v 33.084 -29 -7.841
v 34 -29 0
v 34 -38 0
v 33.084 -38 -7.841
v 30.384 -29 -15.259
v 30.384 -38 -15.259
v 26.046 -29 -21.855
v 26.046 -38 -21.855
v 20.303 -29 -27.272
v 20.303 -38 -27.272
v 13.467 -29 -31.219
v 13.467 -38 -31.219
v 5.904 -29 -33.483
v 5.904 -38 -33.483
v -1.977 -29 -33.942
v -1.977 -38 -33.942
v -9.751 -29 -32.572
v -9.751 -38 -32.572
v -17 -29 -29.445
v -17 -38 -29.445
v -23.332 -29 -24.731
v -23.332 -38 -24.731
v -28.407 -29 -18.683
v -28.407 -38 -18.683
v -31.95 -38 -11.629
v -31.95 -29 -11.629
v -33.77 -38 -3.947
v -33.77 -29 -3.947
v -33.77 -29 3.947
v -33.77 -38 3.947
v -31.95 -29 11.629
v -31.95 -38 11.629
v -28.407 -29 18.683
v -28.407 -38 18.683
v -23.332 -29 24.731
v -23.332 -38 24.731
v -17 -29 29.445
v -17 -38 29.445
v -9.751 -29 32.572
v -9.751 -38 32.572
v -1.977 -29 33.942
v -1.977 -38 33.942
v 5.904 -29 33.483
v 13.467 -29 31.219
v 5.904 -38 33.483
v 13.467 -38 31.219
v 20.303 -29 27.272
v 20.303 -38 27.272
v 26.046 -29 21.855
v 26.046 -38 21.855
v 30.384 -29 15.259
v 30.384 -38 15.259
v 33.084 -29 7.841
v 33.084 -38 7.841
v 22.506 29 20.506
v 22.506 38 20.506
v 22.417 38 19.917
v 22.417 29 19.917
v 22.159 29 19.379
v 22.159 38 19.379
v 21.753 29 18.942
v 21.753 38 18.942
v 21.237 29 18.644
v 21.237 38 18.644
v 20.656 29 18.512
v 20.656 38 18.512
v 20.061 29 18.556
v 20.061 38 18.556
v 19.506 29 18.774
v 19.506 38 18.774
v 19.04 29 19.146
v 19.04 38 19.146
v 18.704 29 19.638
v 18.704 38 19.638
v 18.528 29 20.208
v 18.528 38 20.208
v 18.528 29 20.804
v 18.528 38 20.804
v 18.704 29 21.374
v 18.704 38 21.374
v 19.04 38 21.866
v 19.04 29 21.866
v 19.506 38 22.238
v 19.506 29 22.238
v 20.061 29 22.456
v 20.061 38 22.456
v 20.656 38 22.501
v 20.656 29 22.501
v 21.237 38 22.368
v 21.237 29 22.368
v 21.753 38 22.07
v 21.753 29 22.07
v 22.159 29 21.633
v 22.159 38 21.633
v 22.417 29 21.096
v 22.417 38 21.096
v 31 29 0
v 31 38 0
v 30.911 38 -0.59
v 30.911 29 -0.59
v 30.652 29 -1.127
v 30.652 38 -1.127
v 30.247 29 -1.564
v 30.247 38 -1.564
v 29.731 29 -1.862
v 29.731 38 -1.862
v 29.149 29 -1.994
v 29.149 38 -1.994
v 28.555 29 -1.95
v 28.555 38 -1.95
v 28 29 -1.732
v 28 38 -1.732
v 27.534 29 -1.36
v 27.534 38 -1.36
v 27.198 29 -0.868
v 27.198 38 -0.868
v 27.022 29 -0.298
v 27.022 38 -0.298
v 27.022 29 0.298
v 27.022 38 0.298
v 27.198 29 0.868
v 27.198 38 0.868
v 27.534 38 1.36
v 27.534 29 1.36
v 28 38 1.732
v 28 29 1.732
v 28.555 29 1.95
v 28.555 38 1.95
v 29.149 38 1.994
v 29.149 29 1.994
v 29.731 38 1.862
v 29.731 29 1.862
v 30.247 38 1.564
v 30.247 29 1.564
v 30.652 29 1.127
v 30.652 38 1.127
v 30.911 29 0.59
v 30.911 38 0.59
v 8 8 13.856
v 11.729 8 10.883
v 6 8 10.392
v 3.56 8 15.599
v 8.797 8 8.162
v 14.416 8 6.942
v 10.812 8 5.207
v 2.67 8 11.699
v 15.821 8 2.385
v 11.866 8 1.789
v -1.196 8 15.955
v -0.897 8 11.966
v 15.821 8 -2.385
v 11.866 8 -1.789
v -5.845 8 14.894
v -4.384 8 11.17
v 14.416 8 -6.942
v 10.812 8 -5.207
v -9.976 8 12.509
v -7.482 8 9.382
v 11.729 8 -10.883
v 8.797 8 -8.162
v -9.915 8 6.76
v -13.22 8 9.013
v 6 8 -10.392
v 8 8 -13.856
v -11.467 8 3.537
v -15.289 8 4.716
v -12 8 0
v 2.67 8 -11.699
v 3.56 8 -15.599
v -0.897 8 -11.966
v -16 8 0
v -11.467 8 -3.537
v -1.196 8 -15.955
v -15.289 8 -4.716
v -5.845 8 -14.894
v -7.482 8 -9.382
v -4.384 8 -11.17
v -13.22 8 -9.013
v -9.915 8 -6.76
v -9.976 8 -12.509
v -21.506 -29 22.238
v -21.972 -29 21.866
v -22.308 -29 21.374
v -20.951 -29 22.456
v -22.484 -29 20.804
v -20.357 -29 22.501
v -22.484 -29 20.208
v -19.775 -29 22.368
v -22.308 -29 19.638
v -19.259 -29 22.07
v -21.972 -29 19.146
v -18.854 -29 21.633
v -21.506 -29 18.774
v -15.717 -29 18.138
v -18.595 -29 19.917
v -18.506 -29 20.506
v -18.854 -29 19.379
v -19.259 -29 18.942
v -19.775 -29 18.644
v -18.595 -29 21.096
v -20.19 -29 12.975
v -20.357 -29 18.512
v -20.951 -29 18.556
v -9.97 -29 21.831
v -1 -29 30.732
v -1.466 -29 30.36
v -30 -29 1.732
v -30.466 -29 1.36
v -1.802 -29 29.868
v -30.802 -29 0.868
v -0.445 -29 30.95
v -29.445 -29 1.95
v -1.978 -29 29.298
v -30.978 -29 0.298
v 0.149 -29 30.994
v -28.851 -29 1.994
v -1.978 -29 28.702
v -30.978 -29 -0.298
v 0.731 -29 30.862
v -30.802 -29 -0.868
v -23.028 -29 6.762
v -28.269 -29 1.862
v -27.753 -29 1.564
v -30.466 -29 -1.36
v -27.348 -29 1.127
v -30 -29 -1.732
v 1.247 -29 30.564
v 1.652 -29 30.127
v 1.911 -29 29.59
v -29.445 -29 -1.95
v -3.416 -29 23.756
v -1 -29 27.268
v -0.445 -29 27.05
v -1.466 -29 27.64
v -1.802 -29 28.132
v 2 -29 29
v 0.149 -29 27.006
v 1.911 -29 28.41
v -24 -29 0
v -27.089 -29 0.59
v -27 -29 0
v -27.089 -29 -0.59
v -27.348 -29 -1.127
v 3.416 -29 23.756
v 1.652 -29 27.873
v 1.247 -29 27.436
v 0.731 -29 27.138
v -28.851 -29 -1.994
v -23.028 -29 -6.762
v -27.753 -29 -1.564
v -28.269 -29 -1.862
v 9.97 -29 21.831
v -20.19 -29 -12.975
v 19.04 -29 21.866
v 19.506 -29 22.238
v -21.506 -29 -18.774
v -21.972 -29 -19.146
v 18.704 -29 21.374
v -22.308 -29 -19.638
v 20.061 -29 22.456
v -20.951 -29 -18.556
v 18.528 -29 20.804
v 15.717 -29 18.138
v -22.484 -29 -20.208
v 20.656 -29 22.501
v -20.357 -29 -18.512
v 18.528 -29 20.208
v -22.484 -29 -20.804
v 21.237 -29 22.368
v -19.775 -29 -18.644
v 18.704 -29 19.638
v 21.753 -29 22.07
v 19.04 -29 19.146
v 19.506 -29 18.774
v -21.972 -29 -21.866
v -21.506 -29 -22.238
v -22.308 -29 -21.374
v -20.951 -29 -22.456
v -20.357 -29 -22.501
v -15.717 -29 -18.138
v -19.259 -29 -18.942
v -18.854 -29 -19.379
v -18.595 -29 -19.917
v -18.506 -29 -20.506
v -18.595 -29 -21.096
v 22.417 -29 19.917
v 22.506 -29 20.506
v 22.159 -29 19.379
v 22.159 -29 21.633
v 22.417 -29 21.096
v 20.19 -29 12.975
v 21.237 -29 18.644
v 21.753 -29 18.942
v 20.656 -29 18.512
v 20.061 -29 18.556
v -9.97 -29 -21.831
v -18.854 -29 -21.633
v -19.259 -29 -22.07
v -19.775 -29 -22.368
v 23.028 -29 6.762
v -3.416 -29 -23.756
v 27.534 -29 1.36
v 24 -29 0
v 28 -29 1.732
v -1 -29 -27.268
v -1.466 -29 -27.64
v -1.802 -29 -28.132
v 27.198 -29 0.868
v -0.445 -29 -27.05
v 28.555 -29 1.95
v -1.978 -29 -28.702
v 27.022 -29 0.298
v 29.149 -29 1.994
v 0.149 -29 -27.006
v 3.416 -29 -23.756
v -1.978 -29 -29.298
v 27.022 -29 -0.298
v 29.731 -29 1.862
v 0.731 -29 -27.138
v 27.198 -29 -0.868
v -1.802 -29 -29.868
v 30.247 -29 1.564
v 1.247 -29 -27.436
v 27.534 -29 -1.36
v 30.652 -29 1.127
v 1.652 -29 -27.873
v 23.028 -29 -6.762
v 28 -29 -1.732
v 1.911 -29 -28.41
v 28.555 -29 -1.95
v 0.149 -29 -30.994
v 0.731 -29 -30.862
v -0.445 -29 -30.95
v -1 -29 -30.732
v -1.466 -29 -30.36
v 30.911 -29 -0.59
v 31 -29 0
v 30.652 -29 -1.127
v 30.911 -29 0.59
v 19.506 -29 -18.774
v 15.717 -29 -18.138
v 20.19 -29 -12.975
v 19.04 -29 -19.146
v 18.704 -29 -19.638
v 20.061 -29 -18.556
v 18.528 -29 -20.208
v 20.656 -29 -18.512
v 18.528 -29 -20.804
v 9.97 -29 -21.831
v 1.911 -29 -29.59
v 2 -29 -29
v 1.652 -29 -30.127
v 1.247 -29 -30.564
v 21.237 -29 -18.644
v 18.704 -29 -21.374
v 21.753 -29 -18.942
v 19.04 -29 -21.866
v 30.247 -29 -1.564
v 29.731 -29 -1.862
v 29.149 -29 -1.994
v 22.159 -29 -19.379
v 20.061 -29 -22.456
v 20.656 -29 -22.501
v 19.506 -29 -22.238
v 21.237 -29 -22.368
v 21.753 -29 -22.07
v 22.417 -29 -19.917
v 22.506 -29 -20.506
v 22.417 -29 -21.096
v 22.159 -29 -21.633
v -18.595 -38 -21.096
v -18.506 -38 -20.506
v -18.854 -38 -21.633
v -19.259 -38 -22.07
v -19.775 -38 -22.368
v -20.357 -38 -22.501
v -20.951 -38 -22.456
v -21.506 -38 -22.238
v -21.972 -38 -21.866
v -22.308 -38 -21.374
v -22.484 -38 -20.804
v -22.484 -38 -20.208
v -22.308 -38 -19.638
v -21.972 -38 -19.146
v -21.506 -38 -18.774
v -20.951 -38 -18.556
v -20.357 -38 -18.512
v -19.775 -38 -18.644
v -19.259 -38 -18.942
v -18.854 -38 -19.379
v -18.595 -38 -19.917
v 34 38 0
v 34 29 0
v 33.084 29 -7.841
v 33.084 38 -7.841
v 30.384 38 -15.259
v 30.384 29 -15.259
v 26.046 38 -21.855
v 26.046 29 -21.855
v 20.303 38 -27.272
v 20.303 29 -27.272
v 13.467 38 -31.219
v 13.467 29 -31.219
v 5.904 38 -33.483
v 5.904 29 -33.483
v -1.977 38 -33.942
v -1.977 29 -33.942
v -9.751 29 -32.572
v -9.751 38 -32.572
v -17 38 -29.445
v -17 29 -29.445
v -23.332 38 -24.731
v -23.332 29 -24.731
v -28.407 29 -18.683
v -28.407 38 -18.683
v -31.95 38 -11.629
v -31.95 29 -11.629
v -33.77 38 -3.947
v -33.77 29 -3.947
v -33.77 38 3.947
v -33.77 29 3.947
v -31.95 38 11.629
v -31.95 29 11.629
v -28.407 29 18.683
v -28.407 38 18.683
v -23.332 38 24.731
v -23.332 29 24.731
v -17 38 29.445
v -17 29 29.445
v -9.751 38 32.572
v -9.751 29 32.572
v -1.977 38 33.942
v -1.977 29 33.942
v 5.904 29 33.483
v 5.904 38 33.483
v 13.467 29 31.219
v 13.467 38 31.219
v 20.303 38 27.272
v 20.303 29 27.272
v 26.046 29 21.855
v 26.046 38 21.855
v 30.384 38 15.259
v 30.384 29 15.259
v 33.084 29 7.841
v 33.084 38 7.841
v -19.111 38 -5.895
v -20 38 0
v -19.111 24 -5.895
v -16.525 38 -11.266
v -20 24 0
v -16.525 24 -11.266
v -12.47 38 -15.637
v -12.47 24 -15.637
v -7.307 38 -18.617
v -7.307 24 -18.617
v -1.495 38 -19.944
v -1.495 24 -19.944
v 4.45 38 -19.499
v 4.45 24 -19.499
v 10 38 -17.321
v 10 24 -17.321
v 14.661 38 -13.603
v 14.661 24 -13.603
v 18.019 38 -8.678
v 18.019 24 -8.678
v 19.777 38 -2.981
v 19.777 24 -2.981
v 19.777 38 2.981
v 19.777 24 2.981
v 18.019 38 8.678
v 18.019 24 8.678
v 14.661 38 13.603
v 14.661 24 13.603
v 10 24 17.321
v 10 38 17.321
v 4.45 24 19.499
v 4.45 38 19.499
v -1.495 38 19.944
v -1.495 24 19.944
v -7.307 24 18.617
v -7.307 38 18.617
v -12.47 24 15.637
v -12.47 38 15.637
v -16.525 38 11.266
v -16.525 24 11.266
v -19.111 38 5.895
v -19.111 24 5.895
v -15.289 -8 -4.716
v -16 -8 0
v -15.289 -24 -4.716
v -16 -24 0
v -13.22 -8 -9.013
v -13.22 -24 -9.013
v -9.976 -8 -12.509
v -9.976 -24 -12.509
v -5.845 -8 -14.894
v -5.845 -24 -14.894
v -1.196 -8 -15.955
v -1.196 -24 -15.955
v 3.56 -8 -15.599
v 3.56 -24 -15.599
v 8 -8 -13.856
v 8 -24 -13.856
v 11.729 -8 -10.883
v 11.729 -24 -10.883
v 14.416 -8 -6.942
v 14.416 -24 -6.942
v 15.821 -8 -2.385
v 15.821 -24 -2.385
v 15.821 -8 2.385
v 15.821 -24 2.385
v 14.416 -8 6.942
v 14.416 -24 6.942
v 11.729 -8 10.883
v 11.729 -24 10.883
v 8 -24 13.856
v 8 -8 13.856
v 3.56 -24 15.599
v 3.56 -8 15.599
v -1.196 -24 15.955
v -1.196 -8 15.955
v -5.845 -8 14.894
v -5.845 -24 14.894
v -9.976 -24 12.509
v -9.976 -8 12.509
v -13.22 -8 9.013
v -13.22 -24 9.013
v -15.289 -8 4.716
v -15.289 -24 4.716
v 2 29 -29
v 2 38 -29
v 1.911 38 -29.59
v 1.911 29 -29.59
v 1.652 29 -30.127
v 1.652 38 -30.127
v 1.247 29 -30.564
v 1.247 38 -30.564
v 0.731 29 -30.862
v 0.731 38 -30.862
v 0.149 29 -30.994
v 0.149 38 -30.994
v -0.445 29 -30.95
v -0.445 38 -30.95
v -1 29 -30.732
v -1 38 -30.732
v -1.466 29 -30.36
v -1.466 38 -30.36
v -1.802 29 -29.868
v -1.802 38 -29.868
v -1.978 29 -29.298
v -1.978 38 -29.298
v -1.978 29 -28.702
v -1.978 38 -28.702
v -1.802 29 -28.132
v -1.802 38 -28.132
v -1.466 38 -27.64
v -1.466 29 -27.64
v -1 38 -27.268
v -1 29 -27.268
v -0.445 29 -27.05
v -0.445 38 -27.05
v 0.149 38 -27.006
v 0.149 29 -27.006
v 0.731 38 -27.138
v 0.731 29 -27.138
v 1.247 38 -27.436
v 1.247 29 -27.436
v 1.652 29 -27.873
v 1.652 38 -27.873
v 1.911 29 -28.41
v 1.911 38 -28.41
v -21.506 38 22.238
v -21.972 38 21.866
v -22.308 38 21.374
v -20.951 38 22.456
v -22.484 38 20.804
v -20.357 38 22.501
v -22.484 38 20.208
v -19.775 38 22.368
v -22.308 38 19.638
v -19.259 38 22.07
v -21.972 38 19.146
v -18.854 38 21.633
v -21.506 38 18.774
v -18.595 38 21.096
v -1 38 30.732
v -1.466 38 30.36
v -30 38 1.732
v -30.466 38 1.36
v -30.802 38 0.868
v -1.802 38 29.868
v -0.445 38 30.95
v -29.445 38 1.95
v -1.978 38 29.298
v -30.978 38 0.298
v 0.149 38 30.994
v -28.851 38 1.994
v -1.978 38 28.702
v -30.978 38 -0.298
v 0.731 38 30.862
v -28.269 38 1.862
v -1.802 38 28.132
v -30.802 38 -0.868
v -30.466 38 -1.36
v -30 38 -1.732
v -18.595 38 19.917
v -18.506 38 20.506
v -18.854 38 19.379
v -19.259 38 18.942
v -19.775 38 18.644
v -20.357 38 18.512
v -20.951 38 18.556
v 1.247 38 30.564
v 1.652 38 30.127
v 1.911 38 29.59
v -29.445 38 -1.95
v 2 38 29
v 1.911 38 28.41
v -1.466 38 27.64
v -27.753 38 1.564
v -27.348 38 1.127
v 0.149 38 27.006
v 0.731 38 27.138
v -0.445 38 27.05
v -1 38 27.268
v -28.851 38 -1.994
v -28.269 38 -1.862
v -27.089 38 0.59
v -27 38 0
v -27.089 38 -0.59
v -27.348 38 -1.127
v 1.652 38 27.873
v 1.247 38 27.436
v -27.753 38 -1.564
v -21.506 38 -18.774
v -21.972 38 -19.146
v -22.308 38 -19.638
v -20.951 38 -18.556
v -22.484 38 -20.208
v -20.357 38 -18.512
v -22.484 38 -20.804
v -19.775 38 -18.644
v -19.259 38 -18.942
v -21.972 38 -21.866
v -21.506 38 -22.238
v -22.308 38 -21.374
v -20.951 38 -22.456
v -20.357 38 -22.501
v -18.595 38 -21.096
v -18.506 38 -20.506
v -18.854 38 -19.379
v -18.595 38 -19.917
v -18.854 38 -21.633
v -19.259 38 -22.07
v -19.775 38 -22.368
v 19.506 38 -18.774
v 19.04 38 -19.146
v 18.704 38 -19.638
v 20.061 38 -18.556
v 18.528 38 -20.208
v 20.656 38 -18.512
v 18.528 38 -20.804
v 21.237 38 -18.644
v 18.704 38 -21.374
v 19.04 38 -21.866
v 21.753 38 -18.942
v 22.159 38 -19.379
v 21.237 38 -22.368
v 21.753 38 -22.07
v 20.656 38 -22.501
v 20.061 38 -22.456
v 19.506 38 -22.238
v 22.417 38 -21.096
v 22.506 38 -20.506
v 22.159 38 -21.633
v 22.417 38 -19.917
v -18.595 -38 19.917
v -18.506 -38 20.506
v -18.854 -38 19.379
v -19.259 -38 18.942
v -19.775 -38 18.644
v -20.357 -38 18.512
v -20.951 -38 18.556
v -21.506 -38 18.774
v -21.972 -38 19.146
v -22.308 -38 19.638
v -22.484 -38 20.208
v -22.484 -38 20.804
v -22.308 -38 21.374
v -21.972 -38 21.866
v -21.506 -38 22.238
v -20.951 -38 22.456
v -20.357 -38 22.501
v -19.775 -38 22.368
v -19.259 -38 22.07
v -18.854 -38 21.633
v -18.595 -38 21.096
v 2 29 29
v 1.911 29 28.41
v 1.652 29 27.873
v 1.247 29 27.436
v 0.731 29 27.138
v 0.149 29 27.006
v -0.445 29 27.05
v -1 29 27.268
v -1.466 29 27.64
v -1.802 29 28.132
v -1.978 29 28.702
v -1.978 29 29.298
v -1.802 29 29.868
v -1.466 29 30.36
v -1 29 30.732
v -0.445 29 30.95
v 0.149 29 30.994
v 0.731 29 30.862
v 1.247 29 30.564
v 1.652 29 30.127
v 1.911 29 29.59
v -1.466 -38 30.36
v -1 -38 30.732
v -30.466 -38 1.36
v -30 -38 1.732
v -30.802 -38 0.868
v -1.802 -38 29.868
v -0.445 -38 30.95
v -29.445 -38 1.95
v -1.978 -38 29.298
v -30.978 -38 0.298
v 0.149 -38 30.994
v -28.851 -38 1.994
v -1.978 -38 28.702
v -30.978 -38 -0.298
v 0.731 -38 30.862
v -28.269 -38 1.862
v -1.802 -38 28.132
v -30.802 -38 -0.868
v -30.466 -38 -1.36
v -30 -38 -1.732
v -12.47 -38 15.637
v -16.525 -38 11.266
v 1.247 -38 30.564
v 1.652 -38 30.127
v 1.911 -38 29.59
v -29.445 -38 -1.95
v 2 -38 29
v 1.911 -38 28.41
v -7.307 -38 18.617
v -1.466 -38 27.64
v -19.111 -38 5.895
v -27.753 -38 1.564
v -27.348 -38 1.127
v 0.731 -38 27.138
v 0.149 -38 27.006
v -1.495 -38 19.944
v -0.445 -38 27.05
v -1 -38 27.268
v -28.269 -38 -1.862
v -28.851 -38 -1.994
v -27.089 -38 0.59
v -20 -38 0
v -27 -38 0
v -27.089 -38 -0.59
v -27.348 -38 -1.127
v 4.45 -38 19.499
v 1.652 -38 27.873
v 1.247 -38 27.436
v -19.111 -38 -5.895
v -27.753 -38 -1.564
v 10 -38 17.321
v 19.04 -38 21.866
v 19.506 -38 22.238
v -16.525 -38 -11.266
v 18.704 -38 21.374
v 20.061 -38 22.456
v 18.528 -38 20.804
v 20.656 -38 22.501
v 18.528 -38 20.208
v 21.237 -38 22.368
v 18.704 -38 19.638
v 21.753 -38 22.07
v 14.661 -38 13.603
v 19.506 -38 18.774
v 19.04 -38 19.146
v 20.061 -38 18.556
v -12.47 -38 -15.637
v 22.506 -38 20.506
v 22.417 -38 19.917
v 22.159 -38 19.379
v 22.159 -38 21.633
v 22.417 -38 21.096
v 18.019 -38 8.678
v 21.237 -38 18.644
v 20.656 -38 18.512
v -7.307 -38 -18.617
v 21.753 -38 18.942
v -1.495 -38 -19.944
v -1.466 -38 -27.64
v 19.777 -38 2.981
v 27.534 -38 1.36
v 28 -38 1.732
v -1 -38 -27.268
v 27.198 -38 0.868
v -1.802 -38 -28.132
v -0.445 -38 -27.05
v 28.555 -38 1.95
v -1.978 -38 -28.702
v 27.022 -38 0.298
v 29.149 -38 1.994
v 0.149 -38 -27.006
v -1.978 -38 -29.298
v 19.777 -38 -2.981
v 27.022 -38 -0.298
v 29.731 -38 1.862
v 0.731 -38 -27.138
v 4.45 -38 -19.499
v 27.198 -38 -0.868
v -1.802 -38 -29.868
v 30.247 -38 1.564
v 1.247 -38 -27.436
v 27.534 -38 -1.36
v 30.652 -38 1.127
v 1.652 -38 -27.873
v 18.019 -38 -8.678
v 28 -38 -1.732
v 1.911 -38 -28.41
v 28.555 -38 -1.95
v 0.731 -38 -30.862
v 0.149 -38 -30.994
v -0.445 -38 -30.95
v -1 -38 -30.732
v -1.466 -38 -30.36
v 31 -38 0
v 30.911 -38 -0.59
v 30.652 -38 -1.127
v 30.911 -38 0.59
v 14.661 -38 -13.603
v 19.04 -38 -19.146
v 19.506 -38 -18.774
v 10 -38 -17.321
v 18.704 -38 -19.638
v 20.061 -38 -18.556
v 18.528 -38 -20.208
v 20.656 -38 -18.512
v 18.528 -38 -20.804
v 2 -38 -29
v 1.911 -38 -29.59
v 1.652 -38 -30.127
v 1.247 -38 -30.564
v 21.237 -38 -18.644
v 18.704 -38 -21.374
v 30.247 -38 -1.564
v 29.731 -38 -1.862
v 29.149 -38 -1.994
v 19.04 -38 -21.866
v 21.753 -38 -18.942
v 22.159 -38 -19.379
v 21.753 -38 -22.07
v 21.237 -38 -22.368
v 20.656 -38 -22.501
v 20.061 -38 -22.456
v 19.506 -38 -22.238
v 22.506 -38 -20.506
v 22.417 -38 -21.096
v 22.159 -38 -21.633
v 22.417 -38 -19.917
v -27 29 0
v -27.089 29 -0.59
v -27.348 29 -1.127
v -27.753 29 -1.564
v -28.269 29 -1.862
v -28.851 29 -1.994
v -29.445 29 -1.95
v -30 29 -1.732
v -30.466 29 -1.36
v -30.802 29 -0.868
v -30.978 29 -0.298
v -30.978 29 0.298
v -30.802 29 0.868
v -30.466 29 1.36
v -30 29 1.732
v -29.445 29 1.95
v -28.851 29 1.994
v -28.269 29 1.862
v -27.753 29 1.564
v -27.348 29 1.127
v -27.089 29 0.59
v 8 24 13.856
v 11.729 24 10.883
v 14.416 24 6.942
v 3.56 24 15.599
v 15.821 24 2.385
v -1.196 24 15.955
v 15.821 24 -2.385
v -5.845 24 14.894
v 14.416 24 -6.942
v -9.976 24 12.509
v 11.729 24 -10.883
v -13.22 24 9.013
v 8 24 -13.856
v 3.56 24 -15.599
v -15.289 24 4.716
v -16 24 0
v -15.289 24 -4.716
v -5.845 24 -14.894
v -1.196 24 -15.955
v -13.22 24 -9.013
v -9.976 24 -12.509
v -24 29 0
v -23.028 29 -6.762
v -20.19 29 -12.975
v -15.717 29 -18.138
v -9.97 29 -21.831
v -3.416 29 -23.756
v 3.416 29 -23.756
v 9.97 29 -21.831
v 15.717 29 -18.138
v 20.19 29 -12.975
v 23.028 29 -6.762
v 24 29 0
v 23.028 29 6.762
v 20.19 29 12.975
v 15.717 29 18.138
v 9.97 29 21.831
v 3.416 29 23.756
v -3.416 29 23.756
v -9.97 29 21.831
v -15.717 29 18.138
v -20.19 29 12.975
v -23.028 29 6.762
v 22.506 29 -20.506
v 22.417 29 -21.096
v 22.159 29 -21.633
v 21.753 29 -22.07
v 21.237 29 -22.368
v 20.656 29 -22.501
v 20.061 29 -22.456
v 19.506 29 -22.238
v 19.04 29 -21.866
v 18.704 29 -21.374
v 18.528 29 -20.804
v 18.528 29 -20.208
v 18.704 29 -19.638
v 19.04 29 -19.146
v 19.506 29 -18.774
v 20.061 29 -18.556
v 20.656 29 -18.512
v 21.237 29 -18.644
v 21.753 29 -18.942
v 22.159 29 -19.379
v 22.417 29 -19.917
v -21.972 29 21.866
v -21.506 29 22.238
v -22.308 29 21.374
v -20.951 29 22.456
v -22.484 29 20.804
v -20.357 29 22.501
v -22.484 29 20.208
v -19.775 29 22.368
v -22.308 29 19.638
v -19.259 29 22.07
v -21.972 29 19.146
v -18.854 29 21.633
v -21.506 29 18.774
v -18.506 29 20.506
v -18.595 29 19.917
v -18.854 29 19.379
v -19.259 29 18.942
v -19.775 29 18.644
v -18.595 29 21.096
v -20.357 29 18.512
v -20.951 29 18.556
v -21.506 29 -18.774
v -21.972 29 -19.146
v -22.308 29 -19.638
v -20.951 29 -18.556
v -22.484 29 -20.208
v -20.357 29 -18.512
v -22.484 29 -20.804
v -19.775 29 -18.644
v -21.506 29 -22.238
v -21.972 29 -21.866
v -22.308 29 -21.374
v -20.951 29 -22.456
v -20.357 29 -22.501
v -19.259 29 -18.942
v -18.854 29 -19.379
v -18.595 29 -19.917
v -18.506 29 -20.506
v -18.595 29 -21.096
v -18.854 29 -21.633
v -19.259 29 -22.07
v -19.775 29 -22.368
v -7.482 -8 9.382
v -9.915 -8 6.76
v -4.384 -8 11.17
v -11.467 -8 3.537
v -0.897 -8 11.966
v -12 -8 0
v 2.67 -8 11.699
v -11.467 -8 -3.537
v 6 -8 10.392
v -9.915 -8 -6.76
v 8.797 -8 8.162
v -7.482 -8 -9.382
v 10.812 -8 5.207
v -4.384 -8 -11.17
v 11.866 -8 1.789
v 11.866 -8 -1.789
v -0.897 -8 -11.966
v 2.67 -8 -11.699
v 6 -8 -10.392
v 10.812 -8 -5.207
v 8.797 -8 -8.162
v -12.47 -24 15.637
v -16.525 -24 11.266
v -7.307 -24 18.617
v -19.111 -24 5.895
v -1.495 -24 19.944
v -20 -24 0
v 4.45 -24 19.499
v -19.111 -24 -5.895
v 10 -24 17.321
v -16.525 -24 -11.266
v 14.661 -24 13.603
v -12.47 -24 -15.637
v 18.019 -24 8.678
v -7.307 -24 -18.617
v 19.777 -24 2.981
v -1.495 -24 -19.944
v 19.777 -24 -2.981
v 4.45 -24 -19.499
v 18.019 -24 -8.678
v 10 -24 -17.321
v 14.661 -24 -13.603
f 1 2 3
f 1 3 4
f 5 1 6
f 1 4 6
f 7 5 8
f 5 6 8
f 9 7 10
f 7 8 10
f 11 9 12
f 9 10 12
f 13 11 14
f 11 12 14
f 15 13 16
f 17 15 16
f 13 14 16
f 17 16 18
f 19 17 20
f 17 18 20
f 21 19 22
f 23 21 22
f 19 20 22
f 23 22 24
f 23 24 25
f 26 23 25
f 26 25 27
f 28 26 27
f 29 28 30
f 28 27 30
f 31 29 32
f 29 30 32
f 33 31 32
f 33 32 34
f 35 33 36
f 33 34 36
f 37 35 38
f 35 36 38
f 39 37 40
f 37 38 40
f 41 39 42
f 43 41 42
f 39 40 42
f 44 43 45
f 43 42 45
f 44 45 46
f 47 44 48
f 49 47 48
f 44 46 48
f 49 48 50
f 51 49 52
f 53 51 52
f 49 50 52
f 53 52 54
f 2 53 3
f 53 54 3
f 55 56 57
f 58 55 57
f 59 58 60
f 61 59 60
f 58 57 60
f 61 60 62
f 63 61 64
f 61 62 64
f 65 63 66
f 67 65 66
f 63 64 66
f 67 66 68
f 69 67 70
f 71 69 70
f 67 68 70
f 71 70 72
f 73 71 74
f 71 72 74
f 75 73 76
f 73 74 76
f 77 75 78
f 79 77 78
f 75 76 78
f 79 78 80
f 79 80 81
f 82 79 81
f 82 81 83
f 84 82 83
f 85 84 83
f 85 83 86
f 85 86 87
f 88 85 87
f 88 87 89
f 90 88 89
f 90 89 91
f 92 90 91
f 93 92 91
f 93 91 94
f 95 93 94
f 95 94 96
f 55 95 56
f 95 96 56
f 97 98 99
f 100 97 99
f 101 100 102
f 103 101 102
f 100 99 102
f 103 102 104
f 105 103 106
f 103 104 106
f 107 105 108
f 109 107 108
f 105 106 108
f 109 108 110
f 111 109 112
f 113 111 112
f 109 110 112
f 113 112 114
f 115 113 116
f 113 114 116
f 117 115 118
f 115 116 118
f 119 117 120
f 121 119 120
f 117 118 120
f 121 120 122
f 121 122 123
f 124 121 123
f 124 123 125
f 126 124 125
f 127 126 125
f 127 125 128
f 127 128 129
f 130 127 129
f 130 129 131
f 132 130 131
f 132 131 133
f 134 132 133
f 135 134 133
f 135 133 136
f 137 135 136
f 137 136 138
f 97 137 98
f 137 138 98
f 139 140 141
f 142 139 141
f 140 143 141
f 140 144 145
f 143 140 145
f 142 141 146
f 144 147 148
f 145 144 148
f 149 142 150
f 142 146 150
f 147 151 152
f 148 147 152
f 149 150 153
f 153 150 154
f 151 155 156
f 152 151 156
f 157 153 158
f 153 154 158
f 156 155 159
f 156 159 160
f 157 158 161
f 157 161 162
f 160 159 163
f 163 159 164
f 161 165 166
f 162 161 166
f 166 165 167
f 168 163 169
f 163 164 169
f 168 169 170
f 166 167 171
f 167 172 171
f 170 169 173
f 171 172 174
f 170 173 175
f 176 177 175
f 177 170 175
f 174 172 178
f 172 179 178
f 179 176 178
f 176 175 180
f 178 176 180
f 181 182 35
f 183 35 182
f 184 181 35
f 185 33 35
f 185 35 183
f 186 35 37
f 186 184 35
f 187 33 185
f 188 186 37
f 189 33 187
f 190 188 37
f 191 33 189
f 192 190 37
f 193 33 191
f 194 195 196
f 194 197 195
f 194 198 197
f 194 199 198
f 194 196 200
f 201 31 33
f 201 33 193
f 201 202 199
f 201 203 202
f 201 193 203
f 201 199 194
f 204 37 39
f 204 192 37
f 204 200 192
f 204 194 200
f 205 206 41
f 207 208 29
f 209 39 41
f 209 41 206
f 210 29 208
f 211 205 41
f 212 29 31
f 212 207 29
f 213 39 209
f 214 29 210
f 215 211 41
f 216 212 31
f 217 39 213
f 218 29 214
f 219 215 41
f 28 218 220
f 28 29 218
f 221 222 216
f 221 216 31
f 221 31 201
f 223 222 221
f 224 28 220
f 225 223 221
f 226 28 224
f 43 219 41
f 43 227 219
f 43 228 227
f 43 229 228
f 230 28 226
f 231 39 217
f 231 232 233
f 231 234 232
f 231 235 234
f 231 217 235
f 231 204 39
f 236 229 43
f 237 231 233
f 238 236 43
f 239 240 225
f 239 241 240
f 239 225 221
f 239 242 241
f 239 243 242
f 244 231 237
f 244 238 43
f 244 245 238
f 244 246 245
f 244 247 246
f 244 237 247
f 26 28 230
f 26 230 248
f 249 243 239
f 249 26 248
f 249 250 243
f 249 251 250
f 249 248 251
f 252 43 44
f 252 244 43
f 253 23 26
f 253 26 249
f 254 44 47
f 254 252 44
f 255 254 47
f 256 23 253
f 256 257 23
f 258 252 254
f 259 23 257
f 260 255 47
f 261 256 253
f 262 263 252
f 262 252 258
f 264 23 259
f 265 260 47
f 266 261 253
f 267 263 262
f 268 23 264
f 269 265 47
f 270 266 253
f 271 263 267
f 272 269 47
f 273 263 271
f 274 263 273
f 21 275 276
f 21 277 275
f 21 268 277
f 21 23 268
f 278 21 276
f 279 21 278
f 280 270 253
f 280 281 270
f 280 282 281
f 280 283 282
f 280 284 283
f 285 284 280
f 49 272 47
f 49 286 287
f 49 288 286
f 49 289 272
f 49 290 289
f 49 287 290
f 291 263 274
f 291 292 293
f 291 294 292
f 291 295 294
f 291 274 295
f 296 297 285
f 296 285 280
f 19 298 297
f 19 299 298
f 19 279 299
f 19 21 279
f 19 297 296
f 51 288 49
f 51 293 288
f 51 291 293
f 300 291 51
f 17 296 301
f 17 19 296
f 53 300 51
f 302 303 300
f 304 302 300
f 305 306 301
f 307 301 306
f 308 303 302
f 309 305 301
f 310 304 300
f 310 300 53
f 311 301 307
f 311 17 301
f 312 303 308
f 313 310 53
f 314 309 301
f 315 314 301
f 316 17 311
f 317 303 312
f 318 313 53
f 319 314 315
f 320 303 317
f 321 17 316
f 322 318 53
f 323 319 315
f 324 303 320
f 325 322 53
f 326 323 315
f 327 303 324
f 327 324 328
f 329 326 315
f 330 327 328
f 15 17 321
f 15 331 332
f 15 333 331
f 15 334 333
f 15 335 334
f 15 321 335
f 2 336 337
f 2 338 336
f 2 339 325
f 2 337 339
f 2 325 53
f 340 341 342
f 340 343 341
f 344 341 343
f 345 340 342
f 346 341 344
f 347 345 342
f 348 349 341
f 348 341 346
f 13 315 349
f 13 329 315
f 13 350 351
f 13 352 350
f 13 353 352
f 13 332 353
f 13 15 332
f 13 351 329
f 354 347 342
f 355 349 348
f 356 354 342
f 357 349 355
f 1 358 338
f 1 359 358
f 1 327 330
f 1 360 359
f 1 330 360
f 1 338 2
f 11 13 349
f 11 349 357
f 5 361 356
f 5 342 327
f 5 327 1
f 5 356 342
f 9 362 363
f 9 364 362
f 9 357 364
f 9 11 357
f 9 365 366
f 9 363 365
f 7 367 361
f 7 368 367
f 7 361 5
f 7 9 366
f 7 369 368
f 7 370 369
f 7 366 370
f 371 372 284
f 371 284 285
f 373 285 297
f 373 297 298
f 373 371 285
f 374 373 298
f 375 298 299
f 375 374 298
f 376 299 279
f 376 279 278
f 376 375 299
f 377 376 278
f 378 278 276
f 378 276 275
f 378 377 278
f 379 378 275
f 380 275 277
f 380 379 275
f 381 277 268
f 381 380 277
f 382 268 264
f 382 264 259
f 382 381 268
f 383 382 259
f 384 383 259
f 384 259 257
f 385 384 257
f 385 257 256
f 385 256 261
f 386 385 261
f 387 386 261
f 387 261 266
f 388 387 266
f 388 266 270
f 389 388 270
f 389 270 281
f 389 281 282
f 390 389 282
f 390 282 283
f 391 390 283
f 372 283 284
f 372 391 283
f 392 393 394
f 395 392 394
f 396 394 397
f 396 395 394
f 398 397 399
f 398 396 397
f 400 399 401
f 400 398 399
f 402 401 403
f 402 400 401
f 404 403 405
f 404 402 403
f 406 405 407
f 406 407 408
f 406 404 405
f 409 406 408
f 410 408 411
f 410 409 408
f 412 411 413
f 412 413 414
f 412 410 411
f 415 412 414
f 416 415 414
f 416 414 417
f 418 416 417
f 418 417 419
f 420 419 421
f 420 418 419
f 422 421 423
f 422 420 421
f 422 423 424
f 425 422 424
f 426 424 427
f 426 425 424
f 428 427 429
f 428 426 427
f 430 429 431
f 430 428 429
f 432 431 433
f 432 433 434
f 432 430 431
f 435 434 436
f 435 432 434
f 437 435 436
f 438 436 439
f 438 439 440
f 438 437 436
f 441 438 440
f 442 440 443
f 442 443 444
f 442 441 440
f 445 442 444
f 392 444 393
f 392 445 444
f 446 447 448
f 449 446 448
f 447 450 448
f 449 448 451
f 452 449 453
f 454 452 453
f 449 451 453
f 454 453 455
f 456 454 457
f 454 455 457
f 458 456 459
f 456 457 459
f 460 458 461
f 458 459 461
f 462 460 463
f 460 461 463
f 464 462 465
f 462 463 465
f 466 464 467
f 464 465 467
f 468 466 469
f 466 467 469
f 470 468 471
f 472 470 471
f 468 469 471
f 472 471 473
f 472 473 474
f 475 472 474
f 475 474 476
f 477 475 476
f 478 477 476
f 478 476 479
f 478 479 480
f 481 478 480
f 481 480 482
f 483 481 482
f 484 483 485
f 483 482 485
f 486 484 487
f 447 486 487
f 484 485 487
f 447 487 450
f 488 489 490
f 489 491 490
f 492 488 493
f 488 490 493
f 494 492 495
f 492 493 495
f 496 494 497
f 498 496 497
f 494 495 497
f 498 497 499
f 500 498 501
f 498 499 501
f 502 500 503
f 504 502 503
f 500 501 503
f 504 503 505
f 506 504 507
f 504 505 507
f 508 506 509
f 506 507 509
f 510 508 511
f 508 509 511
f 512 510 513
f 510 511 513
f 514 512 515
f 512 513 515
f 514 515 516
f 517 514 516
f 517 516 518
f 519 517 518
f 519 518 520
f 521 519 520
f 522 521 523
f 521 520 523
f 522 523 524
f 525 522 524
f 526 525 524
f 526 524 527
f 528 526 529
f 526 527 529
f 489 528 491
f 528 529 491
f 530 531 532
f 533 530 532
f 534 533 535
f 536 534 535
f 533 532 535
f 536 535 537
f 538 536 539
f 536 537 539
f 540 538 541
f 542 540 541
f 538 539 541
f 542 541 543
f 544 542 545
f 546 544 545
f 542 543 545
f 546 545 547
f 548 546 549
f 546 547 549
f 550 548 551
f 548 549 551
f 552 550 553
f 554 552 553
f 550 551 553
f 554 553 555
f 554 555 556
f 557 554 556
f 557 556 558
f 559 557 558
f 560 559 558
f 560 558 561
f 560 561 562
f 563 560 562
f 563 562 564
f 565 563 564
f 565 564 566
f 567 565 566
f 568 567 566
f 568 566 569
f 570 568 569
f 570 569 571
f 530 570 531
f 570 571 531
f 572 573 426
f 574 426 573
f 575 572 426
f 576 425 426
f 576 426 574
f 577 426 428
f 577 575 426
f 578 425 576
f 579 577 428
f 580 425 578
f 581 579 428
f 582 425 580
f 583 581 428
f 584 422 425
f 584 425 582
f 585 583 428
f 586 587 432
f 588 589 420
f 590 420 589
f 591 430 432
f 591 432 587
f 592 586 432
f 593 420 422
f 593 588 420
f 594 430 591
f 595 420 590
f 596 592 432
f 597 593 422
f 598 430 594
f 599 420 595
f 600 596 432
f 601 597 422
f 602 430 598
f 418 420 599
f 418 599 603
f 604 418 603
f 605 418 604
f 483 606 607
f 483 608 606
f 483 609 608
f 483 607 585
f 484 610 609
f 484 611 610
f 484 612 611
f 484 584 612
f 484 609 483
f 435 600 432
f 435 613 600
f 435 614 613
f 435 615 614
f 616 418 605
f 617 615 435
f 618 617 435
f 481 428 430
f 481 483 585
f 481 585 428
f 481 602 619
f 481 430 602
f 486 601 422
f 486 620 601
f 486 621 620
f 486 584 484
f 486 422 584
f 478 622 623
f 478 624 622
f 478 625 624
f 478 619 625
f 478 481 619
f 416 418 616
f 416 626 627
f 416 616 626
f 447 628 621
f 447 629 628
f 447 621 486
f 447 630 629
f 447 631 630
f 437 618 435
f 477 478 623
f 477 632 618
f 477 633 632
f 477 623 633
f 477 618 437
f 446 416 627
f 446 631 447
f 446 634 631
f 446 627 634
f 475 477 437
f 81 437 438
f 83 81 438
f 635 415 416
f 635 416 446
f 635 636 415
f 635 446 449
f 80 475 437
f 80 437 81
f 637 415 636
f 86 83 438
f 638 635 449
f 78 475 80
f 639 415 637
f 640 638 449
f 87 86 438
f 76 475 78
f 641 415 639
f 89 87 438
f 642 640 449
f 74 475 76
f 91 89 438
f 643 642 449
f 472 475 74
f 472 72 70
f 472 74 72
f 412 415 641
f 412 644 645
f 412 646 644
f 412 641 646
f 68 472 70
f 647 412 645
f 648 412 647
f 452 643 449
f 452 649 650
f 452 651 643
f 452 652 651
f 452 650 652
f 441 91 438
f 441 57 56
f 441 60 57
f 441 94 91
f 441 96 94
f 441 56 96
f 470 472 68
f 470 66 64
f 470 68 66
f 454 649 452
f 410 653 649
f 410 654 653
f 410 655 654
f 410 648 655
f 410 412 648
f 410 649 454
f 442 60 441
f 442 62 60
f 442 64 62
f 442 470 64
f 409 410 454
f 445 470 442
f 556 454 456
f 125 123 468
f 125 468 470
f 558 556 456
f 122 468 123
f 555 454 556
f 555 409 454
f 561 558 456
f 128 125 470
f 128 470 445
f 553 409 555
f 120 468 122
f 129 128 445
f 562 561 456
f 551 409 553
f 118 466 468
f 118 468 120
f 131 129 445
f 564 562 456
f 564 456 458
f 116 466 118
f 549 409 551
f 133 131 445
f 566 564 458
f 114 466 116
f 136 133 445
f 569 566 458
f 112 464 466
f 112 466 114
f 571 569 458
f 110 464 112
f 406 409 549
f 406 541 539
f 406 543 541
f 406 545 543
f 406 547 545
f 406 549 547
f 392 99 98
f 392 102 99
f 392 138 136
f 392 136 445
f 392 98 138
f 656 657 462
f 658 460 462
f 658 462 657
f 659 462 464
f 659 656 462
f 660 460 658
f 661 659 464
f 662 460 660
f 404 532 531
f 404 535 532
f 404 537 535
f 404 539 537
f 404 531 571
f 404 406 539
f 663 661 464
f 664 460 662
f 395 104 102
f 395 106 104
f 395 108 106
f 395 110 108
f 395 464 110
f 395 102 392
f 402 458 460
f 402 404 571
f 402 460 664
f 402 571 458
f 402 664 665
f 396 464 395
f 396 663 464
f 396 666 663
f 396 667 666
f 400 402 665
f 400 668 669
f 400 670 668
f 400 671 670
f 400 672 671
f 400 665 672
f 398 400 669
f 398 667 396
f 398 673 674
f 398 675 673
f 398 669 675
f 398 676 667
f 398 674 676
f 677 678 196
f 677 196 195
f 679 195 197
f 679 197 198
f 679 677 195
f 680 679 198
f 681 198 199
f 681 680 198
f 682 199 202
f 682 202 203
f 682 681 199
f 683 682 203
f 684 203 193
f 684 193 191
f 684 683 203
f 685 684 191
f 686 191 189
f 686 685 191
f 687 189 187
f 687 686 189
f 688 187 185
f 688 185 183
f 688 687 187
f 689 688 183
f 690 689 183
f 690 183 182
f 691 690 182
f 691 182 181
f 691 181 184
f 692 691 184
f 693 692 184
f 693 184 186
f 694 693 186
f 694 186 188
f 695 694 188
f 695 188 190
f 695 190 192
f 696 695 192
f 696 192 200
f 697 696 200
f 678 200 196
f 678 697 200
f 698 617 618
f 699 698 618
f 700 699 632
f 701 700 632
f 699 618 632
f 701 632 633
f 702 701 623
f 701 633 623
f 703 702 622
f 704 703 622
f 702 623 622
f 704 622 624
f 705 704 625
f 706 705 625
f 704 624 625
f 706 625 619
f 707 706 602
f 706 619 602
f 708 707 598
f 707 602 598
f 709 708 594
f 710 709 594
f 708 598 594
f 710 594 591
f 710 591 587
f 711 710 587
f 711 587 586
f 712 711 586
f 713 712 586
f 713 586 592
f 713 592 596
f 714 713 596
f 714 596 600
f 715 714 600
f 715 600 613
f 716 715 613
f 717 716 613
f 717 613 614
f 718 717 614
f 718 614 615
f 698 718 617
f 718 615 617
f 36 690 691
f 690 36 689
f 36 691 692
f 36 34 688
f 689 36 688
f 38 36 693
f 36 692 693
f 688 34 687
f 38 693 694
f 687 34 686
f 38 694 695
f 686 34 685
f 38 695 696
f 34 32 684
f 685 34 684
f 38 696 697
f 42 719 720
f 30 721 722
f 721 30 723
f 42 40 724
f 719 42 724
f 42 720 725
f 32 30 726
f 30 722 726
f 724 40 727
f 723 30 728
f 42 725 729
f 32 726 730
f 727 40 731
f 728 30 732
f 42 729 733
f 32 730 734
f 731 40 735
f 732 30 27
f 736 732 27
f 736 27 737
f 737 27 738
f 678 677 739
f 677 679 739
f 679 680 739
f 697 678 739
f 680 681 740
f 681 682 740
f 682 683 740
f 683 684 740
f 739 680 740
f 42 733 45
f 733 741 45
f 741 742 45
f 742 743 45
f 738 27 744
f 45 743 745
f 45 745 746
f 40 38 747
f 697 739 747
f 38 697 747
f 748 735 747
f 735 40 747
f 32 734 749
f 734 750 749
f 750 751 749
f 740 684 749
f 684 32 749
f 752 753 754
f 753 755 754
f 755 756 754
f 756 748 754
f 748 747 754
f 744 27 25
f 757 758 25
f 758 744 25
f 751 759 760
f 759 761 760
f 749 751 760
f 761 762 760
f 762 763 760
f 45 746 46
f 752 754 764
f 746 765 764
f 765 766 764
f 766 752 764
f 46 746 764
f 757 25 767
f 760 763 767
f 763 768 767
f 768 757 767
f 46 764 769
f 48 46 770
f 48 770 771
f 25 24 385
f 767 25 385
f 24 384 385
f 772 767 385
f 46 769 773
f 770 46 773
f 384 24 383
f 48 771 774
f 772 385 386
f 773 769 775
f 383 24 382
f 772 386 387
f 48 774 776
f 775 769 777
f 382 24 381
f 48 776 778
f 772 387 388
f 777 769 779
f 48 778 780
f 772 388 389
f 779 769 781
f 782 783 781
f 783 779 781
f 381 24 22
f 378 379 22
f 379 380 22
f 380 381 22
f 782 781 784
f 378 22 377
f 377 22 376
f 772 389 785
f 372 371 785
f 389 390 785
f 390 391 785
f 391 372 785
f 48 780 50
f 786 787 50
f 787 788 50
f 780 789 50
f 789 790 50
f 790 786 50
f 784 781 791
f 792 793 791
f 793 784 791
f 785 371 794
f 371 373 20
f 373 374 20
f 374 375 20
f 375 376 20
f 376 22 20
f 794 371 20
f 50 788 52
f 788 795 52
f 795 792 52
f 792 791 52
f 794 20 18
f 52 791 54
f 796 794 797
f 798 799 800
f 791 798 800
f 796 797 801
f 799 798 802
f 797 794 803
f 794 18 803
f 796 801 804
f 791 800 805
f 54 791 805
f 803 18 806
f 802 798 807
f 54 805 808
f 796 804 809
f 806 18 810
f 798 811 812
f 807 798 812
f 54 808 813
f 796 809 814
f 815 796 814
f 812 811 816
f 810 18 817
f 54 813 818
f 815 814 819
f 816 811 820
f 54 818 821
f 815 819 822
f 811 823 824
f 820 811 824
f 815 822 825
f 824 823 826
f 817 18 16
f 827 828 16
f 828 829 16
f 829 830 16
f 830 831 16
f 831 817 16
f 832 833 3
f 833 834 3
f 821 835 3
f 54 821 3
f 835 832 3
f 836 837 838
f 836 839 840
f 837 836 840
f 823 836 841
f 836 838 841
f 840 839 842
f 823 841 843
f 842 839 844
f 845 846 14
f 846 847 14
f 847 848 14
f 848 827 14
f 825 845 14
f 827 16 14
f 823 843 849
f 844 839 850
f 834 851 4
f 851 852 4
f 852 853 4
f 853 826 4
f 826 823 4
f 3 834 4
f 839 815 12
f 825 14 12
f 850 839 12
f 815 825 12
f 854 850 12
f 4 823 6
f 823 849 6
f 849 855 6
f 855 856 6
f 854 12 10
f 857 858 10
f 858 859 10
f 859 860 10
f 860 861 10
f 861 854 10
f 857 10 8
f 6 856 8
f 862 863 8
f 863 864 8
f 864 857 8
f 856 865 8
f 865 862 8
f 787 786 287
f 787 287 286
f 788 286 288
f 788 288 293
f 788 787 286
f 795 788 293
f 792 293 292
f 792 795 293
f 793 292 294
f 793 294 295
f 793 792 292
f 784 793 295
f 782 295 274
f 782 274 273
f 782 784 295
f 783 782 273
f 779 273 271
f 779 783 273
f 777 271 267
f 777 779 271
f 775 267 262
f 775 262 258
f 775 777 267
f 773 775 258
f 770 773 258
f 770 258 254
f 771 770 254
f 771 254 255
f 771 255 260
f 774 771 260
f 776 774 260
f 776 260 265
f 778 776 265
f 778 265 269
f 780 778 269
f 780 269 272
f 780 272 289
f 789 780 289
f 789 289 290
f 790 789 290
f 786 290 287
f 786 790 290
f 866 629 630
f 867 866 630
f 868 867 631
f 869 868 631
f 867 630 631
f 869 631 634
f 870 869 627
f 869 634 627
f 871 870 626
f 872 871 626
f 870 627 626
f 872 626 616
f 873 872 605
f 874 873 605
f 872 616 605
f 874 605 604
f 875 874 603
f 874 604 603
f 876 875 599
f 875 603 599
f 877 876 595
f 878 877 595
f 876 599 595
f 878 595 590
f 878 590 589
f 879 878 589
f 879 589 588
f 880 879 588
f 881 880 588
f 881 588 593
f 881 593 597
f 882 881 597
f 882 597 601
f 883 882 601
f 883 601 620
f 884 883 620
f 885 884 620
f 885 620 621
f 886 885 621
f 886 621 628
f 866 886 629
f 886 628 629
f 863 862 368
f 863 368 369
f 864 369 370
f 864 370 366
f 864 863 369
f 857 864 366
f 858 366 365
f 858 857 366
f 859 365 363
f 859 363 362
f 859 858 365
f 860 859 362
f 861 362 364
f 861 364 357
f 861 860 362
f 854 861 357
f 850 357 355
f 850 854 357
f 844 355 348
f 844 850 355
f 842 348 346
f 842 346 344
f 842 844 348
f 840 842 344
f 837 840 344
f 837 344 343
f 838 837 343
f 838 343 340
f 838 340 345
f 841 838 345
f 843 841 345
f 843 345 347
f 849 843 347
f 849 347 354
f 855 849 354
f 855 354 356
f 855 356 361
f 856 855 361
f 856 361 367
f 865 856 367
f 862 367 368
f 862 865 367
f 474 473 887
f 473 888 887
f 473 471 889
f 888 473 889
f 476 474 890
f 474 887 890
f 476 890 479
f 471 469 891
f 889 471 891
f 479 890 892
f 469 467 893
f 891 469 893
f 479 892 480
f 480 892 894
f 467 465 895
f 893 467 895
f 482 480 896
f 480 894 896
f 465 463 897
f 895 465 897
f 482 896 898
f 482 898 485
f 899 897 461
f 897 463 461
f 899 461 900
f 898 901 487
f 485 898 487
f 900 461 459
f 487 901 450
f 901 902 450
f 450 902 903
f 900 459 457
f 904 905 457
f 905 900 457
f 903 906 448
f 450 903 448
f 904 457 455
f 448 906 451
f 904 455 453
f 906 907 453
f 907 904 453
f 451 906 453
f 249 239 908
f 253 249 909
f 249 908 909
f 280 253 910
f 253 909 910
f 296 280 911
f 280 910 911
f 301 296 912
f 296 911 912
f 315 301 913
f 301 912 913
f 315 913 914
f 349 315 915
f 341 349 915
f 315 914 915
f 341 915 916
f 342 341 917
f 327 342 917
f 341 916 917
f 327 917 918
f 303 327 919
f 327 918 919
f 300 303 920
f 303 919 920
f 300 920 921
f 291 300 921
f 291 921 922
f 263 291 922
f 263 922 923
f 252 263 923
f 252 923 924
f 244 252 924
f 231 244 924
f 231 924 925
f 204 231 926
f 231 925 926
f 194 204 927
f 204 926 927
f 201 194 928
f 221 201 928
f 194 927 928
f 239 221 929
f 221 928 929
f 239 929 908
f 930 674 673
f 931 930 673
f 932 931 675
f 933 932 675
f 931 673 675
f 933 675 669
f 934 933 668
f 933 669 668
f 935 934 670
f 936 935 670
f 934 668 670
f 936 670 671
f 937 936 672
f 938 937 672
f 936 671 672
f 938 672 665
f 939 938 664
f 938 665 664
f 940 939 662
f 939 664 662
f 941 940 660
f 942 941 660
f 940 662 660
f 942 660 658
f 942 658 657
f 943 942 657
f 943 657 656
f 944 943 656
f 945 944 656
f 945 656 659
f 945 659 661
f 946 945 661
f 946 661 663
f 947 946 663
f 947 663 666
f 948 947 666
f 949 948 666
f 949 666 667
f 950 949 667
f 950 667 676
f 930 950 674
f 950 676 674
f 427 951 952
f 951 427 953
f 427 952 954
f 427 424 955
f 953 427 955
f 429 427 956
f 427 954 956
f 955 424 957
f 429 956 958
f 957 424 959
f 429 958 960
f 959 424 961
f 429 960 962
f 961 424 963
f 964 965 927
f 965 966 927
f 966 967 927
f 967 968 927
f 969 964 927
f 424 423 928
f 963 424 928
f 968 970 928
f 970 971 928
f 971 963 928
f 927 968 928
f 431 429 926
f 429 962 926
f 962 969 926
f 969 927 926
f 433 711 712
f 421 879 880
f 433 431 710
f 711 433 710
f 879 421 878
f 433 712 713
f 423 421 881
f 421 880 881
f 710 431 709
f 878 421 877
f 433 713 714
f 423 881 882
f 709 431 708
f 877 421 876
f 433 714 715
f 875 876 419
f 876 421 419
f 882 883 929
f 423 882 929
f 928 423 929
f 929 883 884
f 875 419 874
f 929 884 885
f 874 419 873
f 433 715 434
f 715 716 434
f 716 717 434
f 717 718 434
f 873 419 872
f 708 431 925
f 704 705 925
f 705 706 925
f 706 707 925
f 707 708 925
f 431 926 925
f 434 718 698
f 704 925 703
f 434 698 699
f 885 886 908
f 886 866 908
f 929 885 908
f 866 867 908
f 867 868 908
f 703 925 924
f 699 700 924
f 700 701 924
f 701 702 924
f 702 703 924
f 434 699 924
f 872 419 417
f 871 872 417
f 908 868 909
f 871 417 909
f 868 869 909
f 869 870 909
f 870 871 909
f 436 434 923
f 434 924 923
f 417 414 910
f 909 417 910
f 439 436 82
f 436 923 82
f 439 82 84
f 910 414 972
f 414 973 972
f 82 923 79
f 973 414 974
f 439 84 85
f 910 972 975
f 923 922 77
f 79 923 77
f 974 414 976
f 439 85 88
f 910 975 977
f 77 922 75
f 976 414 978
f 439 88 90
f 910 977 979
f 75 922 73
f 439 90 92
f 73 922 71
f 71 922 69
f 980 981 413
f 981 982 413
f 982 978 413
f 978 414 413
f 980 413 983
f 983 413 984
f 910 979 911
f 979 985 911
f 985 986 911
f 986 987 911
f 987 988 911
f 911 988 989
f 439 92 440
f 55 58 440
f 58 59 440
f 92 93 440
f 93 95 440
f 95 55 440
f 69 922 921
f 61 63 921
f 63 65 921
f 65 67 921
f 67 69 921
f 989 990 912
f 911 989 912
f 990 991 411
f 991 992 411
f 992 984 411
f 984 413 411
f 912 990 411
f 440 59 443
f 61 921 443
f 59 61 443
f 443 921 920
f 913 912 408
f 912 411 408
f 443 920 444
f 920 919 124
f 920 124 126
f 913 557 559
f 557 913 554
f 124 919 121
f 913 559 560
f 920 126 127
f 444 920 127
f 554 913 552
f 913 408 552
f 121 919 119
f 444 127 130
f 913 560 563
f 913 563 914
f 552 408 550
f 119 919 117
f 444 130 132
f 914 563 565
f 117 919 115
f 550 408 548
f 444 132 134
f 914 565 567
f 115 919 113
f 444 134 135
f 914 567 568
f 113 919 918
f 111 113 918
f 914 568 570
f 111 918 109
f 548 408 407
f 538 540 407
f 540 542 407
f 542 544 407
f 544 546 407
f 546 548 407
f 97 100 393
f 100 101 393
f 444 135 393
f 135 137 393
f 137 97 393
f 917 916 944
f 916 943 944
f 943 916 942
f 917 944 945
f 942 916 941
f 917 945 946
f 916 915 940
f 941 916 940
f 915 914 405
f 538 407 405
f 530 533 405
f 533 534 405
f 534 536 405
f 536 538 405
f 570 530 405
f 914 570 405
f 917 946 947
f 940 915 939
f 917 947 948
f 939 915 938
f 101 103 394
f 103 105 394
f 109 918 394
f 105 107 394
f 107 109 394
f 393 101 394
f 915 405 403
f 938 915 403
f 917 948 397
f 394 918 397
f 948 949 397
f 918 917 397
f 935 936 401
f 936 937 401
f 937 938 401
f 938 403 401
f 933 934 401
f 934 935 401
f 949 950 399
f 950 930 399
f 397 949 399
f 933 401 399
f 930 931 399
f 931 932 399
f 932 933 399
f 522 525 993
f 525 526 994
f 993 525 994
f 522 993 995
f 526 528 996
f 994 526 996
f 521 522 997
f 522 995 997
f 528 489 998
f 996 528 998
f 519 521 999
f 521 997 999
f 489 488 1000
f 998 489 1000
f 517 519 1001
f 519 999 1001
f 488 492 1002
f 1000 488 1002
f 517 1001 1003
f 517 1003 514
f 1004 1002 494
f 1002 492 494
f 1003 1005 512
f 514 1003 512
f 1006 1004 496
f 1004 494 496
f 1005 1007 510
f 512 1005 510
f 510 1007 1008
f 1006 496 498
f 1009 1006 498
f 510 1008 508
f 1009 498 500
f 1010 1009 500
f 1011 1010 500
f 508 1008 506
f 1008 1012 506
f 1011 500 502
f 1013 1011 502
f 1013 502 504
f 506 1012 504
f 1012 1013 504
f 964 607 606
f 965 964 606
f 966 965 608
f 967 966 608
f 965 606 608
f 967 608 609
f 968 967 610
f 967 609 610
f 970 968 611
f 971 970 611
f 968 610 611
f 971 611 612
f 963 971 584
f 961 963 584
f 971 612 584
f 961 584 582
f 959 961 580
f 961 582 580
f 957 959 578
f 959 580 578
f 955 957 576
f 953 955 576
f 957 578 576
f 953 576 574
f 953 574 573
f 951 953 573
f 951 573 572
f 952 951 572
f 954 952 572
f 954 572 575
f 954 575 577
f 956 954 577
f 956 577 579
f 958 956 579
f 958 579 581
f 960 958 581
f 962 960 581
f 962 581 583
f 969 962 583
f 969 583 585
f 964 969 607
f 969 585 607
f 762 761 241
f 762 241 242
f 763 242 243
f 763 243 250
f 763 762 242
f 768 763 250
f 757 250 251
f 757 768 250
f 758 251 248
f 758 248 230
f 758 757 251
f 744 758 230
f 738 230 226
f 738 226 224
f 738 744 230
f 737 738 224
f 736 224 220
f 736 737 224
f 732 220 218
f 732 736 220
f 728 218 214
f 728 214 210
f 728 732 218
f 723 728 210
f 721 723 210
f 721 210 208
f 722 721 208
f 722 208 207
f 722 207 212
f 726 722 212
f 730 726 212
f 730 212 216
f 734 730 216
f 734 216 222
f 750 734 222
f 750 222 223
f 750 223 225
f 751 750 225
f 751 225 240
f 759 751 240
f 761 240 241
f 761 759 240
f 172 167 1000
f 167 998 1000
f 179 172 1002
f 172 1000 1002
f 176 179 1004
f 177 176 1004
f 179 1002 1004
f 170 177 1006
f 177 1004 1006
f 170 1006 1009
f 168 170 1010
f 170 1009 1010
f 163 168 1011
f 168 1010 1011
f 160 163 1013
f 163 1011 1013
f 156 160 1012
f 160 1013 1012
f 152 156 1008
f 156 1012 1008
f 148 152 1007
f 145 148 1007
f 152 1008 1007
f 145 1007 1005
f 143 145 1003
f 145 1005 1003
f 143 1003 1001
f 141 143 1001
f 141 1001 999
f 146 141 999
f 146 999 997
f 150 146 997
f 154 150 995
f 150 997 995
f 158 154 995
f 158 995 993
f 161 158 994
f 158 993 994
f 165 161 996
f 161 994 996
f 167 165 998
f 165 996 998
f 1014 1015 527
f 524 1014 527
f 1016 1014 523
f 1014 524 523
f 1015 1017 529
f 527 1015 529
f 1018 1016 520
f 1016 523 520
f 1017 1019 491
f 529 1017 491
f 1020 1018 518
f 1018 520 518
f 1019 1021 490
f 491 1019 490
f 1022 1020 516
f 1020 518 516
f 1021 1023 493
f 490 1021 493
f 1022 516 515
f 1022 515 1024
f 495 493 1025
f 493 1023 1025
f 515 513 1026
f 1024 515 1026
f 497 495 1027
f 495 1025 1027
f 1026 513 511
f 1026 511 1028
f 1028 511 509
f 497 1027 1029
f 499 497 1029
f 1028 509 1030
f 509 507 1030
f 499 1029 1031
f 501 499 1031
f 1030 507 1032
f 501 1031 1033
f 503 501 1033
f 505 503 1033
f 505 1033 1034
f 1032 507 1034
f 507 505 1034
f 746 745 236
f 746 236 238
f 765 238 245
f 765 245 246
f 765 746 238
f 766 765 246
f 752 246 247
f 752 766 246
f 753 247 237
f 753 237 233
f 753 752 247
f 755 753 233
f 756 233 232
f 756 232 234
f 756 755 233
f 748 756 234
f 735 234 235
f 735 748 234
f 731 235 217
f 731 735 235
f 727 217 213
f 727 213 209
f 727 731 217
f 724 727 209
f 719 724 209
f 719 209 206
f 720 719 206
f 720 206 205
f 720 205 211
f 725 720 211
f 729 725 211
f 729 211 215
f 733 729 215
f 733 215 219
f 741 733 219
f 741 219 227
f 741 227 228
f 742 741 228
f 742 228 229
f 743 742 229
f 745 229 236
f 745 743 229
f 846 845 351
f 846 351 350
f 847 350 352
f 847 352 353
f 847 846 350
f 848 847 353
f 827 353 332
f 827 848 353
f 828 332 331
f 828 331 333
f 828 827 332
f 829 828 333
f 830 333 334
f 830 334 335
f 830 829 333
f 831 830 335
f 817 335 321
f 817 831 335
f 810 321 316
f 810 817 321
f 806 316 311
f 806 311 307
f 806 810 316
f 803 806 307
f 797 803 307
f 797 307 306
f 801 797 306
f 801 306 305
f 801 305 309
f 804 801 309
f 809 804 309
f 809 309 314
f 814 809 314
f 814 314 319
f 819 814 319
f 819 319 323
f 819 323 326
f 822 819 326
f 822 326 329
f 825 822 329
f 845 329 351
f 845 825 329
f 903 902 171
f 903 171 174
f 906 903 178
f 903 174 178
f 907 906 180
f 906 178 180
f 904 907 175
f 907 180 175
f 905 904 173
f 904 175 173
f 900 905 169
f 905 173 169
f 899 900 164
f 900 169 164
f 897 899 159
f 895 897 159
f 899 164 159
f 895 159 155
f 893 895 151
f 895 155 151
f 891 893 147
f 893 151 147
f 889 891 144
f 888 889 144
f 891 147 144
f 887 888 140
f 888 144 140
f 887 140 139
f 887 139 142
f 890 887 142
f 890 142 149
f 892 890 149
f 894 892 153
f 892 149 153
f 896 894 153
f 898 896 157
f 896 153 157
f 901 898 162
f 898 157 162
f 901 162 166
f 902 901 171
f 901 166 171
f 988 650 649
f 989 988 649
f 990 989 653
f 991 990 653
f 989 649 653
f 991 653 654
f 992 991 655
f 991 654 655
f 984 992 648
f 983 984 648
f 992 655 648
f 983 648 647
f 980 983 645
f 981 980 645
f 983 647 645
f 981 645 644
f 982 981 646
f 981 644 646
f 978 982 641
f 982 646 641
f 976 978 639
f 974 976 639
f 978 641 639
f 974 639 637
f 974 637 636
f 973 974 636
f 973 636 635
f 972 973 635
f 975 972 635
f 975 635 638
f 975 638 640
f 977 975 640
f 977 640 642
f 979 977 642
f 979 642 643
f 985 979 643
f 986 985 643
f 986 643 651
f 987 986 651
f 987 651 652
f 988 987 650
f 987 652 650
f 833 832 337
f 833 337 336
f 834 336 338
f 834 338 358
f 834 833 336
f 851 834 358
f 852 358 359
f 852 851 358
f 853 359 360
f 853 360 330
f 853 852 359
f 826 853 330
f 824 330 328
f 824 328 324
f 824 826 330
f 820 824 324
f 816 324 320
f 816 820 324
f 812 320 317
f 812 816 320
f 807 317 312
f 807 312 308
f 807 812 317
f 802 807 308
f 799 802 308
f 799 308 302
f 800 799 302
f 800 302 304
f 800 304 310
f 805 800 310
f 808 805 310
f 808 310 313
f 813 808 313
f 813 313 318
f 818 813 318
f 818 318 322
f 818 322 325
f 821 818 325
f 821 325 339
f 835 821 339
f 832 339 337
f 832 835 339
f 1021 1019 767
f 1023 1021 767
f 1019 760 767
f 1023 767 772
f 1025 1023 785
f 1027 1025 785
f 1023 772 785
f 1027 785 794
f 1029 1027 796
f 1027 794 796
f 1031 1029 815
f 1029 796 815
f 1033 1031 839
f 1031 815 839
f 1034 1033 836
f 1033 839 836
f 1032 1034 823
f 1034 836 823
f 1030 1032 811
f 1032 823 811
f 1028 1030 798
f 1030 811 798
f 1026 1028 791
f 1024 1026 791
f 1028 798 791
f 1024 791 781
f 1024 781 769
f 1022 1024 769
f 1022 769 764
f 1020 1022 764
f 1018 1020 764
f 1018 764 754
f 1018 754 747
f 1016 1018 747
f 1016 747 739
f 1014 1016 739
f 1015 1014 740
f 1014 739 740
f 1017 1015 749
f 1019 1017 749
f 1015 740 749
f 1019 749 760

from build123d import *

# Parameters (mm, degrees)
SKETCH4_R           = 34
SKETCH4_R_2         = 24
SKETCH4_R_3         = 2
BOSS_EXTRUDE1_DEPTH = 9


with BuildPart() as part:
    # Sketch1 → Revolve1 (revolve)
    with BuildSketch(Plane.XY):
        Polygon((-12, 8), (-12, -8), (-16, -8), (-16, -24), (-20, -24), (-20, -38), (-24, -38), (-24, 38), (-20, 38), (-20, 24), (-16, 24), (-16, 8), align=None)
    revolve(axis=Axis((0, 75.096781517, 0), (0, -1, 0)))

    # Sketch4 → Boss-Extrude1 (add)
    with BuildSketch(Plane(origin=(0, 38, 0), x_dir=(1, 0, 0), z_dir=(0, 1, 0))):
        Circle(SKETCH4_R)
        Circle(SKETCH4_R_2, mode=Mode.SUBTRACT)
        with Locations((0, 29)):
            Circle(SKETCH4_R_3, mode=Mode.SUBTRACT)
        with Locations((20.506096654, 20.506096654)):
            Circle(SKETCH4_R_3, mode=Mode.SUBTRACT)
        with Locations((29, 0)):
            Circle(SKETCH4_R_3, mode=Mode.SUBTRACT)
        with Locations((20.506096654, -20.506096654)):
            Circle(SKETCH4_R_3, mode=Mode.SUBTRACT)
        with Locations((0, -29)):
            Circle(SKETCH4_R_3, mode=Mode.SUBTRACT)
        with Locations((-20.506096654, -20.506096654)):
            Circle(SKETCH4_R_3, mode=Mode.SUBTRACT)
        with Locations((-29, 0)):
            Circle(SKETCH4_R_3, mode=Mode.SUBTRACT)
        with Locations((-20.506096654, 20.506096654)):
            Circle(SKETCH4_R_3, mode=Mode.SUBTRACT)
    boss_extrude1 = extrude(amount=-BOSS_EXTRUDE1_DEPTH)

    # Mirror1: Boss-Extrude1 across plane
    add(boss_extrude1.mirror(Plane.ZX))


solid = part.part
